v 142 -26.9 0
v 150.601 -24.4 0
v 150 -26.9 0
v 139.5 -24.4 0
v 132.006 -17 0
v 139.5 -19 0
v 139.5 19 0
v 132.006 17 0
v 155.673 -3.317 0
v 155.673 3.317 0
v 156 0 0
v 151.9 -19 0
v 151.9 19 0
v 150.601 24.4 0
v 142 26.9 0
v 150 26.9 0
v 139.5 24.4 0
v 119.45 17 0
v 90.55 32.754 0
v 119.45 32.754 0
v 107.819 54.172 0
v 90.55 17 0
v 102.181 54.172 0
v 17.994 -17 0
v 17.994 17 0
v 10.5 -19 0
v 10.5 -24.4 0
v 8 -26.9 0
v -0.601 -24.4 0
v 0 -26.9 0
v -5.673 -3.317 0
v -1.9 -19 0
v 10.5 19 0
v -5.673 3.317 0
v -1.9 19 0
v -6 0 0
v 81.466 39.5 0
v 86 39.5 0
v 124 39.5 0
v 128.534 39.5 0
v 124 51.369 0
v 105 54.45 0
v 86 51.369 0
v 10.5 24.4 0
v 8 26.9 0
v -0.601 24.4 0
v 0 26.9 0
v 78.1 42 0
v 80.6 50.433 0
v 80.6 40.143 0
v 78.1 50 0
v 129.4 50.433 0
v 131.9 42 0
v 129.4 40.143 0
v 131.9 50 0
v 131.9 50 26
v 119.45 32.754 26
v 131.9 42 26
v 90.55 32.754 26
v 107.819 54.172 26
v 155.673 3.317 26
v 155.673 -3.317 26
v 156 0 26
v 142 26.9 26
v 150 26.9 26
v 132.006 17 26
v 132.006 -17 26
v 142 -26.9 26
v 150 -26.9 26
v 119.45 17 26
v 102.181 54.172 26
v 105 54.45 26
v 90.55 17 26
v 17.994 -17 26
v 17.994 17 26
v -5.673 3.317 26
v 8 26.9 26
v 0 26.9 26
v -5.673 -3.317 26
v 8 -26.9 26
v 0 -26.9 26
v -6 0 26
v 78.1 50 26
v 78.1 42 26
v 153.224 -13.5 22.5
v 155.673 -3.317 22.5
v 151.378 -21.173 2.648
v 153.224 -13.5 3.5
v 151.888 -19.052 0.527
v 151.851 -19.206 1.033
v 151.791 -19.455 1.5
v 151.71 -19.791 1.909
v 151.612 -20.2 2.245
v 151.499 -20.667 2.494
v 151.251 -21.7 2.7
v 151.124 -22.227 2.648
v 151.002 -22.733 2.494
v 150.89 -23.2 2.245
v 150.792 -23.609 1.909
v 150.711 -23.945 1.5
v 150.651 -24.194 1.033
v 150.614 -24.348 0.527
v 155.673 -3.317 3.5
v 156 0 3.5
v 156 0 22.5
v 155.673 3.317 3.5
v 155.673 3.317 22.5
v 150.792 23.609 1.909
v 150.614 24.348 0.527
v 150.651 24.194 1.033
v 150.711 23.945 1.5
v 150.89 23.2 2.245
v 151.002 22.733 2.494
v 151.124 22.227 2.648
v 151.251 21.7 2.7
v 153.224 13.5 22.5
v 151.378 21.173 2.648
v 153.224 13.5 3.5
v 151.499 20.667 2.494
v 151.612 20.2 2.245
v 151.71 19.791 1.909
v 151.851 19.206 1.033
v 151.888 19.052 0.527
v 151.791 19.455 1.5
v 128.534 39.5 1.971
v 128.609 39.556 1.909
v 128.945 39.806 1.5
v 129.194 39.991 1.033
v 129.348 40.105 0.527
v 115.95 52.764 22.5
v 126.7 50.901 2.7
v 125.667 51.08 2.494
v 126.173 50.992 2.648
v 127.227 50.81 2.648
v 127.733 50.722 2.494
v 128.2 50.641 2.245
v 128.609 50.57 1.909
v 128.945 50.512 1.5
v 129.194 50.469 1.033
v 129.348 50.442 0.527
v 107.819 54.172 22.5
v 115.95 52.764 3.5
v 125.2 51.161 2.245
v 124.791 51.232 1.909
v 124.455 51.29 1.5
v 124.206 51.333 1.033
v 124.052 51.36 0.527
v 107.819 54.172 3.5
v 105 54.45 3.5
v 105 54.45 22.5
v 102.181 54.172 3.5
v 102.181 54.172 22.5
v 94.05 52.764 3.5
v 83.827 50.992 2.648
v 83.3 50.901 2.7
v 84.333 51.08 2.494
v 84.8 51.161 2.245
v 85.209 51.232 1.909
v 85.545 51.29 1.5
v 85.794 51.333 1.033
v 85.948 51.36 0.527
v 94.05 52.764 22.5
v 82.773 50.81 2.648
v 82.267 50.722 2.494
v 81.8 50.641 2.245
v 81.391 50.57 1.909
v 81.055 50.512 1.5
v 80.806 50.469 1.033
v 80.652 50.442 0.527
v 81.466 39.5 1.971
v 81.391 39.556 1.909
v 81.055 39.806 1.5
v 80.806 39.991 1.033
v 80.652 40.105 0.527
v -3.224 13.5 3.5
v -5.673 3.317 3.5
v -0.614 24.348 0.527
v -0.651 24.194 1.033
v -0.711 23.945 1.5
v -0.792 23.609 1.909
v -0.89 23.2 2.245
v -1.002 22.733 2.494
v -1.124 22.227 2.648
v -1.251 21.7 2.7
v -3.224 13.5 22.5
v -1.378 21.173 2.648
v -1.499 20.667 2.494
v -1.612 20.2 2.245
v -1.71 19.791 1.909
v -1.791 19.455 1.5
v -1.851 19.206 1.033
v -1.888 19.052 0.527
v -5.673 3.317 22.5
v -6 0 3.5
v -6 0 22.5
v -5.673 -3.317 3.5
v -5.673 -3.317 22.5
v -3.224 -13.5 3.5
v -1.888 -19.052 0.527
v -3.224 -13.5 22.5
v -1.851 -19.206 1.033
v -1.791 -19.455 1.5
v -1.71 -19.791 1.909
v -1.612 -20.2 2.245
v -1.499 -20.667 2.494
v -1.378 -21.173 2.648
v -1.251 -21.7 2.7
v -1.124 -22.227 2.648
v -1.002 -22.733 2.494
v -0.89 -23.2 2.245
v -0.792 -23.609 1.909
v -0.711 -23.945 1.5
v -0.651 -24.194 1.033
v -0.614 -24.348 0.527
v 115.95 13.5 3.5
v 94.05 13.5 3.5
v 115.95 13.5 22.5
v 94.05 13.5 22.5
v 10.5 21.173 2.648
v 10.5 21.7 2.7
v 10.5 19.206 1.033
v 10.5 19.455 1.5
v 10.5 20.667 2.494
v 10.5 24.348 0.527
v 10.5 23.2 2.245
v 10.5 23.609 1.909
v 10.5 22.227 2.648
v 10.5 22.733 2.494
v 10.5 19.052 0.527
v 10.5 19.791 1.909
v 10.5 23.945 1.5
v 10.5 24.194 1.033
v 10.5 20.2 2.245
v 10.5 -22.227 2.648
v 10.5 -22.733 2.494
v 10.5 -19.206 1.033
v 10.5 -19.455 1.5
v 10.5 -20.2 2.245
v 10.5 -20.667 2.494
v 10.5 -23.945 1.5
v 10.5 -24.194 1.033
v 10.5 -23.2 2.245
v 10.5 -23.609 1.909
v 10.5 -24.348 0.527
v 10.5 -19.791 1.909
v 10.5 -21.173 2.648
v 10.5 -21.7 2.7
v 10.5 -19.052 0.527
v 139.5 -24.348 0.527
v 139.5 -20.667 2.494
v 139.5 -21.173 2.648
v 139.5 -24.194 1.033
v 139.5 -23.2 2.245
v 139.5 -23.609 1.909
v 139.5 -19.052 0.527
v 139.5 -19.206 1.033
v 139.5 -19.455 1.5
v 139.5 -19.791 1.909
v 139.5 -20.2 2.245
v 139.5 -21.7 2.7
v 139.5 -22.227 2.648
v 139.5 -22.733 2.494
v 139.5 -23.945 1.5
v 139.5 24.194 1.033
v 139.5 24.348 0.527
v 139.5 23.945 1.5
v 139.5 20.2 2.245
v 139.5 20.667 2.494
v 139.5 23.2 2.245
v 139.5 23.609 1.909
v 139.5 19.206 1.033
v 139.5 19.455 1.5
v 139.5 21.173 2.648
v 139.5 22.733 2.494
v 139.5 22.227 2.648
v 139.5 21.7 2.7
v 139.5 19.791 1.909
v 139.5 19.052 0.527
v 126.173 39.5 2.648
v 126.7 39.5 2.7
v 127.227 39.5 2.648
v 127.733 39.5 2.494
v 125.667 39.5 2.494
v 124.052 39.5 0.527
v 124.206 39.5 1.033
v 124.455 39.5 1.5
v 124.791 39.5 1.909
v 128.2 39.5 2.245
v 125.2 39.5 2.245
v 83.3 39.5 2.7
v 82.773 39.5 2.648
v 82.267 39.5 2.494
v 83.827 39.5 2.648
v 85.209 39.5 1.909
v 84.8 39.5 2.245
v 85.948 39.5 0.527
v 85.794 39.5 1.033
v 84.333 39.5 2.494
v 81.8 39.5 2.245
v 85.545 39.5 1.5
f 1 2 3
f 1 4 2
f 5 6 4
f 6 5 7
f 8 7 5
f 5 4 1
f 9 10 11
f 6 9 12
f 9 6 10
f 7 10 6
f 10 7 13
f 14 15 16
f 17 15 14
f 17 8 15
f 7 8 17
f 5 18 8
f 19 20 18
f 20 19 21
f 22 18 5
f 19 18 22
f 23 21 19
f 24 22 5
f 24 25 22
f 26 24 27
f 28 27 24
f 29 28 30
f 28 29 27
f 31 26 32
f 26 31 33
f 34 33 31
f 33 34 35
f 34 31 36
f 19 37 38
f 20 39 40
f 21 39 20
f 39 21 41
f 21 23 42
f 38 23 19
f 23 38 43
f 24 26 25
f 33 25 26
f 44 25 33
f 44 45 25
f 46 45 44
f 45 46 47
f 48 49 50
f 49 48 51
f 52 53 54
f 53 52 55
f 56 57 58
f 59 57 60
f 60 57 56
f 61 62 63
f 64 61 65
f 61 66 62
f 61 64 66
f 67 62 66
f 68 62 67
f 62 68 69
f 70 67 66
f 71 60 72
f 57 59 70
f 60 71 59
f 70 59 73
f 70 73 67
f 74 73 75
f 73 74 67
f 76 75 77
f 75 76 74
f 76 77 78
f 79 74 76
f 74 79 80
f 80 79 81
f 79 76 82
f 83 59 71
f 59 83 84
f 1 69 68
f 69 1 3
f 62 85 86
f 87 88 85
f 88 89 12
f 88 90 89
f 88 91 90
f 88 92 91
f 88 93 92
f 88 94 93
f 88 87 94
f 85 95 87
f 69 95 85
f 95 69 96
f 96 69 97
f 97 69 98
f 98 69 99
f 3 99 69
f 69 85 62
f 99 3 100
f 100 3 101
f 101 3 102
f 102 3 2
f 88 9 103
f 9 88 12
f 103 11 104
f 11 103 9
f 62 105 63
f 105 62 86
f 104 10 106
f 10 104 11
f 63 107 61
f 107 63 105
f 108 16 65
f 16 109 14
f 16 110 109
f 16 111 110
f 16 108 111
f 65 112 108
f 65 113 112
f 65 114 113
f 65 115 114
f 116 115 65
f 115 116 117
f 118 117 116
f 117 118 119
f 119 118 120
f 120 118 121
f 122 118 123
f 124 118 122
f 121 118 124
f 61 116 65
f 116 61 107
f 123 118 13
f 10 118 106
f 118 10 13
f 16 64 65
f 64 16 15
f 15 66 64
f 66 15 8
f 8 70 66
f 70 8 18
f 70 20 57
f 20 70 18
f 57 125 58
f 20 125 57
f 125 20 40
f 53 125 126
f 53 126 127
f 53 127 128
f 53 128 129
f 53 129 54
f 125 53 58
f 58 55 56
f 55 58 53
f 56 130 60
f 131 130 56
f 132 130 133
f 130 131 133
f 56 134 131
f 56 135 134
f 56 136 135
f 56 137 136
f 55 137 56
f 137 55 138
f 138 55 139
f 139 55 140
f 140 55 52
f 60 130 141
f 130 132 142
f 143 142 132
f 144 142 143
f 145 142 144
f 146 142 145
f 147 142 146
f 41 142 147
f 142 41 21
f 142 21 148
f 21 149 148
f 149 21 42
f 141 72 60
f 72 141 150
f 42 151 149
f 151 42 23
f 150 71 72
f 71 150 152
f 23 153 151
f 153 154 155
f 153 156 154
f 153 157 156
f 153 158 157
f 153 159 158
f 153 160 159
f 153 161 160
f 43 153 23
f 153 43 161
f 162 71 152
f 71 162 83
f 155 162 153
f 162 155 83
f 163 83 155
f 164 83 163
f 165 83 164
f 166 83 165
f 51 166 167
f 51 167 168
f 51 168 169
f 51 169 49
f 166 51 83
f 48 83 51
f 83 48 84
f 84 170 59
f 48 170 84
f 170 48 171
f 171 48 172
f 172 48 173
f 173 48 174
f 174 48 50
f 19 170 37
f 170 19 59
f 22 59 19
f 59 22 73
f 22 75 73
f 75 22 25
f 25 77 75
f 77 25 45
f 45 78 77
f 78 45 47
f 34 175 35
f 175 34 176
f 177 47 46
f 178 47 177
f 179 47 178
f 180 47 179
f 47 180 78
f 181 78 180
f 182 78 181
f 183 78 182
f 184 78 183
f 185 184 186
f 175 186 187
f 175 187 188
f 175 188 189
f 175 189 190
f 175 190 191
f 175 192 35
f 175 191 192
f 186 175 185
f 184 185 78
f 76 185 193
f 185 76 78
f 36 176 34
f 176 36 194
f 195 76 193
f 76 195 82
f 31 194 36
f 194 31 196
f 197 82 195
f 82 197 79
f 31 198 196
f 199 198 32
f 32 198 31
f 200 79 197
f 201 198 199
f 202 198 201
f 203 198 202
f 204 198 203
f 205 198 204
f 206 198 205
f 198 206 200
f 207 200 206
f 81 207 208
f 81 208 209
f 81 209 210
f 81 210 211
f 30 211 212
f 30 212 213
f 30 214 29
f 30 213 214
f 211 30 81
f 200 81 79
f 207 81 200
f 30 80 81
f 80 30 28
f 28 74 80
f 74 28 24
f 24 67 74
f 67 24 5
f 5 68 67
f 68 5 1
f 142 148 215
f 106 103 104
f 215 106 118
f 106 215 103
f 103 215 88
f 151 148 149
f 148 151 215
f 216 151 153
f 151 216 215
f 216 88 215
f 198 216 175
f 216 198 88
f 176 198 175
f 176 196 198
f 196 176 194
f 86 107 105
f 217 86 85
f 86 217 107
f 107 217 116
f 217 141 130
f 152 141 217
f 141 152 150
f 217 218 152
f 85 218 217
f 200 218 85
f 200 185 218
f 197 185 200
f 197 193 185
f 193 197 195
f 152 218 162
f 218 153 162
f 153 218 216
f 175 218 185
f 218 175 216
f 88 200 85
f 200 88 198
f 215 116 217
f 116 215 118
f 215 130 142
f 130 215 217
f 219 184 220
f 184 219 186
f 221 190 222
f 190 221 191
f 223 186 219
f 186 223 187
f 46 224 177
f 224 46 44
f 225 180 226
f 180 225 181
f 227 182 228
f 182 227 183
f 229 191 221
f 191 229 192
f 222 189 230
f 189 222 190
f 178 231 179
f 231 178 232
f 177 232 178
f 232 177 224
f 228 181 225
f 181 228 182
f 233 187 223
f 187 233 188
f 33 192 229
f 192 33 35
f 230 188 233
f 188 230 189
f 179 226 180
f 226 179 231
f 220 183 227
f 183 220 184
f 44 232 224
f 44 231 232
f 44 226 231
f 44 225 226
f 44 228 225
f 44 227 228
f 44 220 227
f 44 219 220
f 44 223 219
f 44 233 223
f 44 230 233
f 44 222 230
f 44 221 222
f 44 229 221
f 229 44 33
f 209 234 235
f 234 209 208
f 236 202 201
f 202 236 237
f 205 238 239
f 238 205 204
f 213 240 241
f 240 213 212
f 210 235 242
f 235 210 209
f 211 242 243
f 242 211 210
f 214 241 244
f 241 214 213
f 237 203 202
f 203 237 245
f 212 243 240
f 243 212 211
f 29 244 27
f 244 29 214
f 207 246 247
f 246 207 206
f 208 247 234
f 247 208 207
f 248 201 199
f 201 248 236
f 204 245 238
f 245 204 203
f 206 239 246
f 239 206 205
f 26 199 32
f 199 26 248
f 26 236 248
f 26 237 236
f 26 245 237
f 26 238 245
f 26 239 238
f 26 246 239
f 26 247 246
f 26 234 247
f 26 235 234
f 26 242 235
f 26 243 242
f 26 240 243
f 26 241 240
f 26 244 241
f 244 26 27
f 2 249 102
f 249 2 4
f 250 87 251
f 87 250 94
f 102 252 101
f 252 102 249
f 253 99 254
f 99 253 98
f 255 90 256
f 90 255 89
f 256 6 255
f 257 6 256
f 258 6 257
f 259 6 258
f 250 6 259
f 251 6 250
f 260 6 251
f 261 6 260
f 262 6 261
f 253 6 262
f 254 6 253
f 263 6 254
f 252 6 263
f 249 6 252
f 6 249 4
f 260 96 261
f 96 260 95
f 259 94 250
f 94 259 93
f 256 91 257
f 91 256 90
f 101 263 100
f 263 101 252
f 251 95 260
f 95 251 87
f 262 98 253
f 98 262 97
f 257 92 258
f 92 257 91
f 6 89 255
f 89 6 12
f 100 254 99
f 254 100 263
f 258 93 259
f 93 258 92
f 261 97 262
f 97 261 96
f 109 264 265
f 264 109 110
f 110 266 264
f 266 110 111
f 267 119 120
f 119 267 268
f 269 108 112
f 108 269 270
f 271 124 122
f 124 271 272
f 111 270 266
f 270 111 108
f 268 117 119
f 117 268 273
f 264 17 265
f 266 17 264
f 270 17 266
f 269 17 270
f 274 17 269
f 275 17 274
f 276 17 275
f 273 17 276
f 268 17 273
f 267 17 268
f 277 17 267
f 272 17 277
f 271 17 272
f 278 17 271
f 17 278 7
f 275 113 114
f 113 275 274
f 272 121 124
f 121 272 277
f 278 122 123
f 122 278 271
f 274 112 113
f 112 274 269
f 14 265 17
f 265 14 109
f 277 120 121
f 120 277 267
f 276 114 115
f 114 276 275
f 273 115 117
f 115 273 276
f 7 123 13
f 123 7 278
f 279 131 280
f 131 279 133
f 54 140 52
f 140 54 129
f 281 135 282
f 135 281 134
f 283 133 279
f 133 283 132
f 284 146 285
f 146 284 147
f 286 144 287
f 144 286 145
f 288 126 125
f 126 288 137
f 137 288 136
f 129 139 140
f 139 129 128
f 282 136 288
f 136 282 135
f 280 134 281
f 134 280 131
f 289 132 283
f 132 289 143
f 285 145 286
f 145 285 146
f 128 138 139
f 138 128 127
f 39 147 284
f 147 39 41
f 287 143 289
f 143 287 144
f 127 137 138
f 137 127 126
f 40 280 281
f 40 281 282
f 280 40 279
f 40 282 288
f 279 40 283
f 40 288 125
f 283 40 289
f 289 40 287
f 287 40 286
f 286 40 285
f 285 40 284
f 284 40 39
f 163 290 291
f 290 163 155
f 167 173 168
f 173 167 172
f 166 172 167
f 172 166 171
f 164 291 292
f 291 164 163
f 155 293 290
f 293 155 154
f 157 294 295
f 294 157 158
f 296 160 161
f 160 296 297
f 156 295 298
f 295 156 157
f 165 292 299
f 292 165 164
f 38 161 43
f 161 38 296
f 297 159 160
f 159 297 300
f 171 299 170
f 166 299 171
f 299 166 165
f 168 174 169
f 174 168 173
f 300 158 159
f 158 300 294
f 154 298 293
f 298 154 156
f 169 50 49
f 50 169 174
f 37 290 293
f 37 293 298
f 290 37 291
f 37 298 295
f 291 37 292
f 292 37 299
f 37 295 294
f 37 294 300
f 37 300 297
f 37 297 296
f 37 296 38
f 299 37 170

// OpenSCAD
$fn = 32;

// ----------------------------------------------------------------------
// Air duct: 34 mm duct, 3.5 mm wall, 26 mm across
// ----------------------------------------------------------------------

// --- parameters (mm) ---
duct_r = 17;              // duct core radius
duct_d = 34;              // duct core diameter
wall = 3.5;               // duct wall thickness
height = 26;              // duct width (extrusion height)
port_r = 26.9;            // port flange half width
port_d = 53.8;            // port flange width
port_t = 8;               // port flange thickness
bolt_d = 5.4;             // port bolt holes
bolt_offset = 21.7;       // bolt hole offset from the port axis
branch_r = 14.45;         // branch core radius
branch_d = 28.9;          // branch core diameter
branch_len = 50;          // branch length from the run axis

difference() {
  /* outer hull chain: tube with a flat flange plate at every port */
  linear_extrude(height = 26) {
    hull() {
      polygon([[0, -26.9], [0, 26.9], [8, 26.9], [8, -26.9]]);
      translate([11, 0]) circle(r = 17);
    }
    hull() {
      translate([11, 0]) circle(r = 17);
      translate([45, 0]) circle(r = 17);
    }
    hull() {
      translate([45, 0]) circle(r = 17);
      translate([105, 0]) circle(r = 17);
    }
    hull() {
      translate([105, 0]) circle(r = 17);
      translate([139, 0]) circle(r = 17);
    }
    hull() {
      translate([139, 0]) circle(r = 17);
      polygon([[150, 26.9], [150, -26.9], [142, -26.9], [142, 26.9]]);
    }
    hull() {
      translate([105, 0]) circle(r = 14.45);
      translate([105, 27.5]) circle(r = 14.45);
    }
    hull() {
      translate([105, 27.5]) circle(r = 14.45);
      translate([105, 40]) circle(r = 14.45);
    }
    hull() {
      translate([105, 40]) circle(r = 14.45);
      polygon([[78.1, 50], [131.9, 50], [131.9, 42], [78.1, 42]]);
    }
  }
  /* air passage: the same chain inset by the wall, 5 mm proud of the ports */
  translate([0, 0, 3.5]) linear_extrude(height = 19) {
    hull() {
      translate([-5, 0]) circle(r = 13.5);
      translate([45, 0]) circle(r = 13.5);
    }
    hull() {
      translate([45, 0]) circle(r = 13.5);
      translate([105, 0]) circle(r = 13.5);
    }
    hull() {
      translate([105, 0]) circle(r = 13.5);
      translate([155, 0]) circle(r = 13.5);
    }
    hull() {
      translate([105, 0]) circle(r = 10.95);
      translate([105, 27.5]) circle(r = 10.95);
    }
    hull() {
      translate([105, 27.5]) circle(r = 10.95);
      translate([105, 55]) circle(r = 10.95);
    }
  }
  translate([0, 0]) rotate([0, 0, -90]) translate([-21.7, -2.5]) rotate([-90, 0, 0]) cylinder(h = 13, d = 5.4);
  translate([0, 0]) rotate([0, 0, -90]) translate([21.7, -2.5]) rotate([-90, 0, 0]) cylinder(h = 13, d = 5.4);
  translate([150, 0]) rotate([0, 0, 90]) translate([-21.7, -2.5]) rotate([-90, 0, 0]) cylinder(h = 13, d = 5.4);
  translate([150, 0]) rotate([0, 0, 90]) translate([21.7, -2.5]) rotate([-90, 0, 0]) cylinder(h = 13, d = 5.4);
  translate([105, 50]) rotate([0, 0, 180]) translate([-21.7, -2.5]) rotate([-90, 0, 0]) cylinder(h = 13, d = 5.4);
  translate([105, 50]) rotate([0, 0, 180]) translate([21.7, -2.5]) rotate([-90, 0, 0]) cylinder(h = 13, d = 5.4);
}
